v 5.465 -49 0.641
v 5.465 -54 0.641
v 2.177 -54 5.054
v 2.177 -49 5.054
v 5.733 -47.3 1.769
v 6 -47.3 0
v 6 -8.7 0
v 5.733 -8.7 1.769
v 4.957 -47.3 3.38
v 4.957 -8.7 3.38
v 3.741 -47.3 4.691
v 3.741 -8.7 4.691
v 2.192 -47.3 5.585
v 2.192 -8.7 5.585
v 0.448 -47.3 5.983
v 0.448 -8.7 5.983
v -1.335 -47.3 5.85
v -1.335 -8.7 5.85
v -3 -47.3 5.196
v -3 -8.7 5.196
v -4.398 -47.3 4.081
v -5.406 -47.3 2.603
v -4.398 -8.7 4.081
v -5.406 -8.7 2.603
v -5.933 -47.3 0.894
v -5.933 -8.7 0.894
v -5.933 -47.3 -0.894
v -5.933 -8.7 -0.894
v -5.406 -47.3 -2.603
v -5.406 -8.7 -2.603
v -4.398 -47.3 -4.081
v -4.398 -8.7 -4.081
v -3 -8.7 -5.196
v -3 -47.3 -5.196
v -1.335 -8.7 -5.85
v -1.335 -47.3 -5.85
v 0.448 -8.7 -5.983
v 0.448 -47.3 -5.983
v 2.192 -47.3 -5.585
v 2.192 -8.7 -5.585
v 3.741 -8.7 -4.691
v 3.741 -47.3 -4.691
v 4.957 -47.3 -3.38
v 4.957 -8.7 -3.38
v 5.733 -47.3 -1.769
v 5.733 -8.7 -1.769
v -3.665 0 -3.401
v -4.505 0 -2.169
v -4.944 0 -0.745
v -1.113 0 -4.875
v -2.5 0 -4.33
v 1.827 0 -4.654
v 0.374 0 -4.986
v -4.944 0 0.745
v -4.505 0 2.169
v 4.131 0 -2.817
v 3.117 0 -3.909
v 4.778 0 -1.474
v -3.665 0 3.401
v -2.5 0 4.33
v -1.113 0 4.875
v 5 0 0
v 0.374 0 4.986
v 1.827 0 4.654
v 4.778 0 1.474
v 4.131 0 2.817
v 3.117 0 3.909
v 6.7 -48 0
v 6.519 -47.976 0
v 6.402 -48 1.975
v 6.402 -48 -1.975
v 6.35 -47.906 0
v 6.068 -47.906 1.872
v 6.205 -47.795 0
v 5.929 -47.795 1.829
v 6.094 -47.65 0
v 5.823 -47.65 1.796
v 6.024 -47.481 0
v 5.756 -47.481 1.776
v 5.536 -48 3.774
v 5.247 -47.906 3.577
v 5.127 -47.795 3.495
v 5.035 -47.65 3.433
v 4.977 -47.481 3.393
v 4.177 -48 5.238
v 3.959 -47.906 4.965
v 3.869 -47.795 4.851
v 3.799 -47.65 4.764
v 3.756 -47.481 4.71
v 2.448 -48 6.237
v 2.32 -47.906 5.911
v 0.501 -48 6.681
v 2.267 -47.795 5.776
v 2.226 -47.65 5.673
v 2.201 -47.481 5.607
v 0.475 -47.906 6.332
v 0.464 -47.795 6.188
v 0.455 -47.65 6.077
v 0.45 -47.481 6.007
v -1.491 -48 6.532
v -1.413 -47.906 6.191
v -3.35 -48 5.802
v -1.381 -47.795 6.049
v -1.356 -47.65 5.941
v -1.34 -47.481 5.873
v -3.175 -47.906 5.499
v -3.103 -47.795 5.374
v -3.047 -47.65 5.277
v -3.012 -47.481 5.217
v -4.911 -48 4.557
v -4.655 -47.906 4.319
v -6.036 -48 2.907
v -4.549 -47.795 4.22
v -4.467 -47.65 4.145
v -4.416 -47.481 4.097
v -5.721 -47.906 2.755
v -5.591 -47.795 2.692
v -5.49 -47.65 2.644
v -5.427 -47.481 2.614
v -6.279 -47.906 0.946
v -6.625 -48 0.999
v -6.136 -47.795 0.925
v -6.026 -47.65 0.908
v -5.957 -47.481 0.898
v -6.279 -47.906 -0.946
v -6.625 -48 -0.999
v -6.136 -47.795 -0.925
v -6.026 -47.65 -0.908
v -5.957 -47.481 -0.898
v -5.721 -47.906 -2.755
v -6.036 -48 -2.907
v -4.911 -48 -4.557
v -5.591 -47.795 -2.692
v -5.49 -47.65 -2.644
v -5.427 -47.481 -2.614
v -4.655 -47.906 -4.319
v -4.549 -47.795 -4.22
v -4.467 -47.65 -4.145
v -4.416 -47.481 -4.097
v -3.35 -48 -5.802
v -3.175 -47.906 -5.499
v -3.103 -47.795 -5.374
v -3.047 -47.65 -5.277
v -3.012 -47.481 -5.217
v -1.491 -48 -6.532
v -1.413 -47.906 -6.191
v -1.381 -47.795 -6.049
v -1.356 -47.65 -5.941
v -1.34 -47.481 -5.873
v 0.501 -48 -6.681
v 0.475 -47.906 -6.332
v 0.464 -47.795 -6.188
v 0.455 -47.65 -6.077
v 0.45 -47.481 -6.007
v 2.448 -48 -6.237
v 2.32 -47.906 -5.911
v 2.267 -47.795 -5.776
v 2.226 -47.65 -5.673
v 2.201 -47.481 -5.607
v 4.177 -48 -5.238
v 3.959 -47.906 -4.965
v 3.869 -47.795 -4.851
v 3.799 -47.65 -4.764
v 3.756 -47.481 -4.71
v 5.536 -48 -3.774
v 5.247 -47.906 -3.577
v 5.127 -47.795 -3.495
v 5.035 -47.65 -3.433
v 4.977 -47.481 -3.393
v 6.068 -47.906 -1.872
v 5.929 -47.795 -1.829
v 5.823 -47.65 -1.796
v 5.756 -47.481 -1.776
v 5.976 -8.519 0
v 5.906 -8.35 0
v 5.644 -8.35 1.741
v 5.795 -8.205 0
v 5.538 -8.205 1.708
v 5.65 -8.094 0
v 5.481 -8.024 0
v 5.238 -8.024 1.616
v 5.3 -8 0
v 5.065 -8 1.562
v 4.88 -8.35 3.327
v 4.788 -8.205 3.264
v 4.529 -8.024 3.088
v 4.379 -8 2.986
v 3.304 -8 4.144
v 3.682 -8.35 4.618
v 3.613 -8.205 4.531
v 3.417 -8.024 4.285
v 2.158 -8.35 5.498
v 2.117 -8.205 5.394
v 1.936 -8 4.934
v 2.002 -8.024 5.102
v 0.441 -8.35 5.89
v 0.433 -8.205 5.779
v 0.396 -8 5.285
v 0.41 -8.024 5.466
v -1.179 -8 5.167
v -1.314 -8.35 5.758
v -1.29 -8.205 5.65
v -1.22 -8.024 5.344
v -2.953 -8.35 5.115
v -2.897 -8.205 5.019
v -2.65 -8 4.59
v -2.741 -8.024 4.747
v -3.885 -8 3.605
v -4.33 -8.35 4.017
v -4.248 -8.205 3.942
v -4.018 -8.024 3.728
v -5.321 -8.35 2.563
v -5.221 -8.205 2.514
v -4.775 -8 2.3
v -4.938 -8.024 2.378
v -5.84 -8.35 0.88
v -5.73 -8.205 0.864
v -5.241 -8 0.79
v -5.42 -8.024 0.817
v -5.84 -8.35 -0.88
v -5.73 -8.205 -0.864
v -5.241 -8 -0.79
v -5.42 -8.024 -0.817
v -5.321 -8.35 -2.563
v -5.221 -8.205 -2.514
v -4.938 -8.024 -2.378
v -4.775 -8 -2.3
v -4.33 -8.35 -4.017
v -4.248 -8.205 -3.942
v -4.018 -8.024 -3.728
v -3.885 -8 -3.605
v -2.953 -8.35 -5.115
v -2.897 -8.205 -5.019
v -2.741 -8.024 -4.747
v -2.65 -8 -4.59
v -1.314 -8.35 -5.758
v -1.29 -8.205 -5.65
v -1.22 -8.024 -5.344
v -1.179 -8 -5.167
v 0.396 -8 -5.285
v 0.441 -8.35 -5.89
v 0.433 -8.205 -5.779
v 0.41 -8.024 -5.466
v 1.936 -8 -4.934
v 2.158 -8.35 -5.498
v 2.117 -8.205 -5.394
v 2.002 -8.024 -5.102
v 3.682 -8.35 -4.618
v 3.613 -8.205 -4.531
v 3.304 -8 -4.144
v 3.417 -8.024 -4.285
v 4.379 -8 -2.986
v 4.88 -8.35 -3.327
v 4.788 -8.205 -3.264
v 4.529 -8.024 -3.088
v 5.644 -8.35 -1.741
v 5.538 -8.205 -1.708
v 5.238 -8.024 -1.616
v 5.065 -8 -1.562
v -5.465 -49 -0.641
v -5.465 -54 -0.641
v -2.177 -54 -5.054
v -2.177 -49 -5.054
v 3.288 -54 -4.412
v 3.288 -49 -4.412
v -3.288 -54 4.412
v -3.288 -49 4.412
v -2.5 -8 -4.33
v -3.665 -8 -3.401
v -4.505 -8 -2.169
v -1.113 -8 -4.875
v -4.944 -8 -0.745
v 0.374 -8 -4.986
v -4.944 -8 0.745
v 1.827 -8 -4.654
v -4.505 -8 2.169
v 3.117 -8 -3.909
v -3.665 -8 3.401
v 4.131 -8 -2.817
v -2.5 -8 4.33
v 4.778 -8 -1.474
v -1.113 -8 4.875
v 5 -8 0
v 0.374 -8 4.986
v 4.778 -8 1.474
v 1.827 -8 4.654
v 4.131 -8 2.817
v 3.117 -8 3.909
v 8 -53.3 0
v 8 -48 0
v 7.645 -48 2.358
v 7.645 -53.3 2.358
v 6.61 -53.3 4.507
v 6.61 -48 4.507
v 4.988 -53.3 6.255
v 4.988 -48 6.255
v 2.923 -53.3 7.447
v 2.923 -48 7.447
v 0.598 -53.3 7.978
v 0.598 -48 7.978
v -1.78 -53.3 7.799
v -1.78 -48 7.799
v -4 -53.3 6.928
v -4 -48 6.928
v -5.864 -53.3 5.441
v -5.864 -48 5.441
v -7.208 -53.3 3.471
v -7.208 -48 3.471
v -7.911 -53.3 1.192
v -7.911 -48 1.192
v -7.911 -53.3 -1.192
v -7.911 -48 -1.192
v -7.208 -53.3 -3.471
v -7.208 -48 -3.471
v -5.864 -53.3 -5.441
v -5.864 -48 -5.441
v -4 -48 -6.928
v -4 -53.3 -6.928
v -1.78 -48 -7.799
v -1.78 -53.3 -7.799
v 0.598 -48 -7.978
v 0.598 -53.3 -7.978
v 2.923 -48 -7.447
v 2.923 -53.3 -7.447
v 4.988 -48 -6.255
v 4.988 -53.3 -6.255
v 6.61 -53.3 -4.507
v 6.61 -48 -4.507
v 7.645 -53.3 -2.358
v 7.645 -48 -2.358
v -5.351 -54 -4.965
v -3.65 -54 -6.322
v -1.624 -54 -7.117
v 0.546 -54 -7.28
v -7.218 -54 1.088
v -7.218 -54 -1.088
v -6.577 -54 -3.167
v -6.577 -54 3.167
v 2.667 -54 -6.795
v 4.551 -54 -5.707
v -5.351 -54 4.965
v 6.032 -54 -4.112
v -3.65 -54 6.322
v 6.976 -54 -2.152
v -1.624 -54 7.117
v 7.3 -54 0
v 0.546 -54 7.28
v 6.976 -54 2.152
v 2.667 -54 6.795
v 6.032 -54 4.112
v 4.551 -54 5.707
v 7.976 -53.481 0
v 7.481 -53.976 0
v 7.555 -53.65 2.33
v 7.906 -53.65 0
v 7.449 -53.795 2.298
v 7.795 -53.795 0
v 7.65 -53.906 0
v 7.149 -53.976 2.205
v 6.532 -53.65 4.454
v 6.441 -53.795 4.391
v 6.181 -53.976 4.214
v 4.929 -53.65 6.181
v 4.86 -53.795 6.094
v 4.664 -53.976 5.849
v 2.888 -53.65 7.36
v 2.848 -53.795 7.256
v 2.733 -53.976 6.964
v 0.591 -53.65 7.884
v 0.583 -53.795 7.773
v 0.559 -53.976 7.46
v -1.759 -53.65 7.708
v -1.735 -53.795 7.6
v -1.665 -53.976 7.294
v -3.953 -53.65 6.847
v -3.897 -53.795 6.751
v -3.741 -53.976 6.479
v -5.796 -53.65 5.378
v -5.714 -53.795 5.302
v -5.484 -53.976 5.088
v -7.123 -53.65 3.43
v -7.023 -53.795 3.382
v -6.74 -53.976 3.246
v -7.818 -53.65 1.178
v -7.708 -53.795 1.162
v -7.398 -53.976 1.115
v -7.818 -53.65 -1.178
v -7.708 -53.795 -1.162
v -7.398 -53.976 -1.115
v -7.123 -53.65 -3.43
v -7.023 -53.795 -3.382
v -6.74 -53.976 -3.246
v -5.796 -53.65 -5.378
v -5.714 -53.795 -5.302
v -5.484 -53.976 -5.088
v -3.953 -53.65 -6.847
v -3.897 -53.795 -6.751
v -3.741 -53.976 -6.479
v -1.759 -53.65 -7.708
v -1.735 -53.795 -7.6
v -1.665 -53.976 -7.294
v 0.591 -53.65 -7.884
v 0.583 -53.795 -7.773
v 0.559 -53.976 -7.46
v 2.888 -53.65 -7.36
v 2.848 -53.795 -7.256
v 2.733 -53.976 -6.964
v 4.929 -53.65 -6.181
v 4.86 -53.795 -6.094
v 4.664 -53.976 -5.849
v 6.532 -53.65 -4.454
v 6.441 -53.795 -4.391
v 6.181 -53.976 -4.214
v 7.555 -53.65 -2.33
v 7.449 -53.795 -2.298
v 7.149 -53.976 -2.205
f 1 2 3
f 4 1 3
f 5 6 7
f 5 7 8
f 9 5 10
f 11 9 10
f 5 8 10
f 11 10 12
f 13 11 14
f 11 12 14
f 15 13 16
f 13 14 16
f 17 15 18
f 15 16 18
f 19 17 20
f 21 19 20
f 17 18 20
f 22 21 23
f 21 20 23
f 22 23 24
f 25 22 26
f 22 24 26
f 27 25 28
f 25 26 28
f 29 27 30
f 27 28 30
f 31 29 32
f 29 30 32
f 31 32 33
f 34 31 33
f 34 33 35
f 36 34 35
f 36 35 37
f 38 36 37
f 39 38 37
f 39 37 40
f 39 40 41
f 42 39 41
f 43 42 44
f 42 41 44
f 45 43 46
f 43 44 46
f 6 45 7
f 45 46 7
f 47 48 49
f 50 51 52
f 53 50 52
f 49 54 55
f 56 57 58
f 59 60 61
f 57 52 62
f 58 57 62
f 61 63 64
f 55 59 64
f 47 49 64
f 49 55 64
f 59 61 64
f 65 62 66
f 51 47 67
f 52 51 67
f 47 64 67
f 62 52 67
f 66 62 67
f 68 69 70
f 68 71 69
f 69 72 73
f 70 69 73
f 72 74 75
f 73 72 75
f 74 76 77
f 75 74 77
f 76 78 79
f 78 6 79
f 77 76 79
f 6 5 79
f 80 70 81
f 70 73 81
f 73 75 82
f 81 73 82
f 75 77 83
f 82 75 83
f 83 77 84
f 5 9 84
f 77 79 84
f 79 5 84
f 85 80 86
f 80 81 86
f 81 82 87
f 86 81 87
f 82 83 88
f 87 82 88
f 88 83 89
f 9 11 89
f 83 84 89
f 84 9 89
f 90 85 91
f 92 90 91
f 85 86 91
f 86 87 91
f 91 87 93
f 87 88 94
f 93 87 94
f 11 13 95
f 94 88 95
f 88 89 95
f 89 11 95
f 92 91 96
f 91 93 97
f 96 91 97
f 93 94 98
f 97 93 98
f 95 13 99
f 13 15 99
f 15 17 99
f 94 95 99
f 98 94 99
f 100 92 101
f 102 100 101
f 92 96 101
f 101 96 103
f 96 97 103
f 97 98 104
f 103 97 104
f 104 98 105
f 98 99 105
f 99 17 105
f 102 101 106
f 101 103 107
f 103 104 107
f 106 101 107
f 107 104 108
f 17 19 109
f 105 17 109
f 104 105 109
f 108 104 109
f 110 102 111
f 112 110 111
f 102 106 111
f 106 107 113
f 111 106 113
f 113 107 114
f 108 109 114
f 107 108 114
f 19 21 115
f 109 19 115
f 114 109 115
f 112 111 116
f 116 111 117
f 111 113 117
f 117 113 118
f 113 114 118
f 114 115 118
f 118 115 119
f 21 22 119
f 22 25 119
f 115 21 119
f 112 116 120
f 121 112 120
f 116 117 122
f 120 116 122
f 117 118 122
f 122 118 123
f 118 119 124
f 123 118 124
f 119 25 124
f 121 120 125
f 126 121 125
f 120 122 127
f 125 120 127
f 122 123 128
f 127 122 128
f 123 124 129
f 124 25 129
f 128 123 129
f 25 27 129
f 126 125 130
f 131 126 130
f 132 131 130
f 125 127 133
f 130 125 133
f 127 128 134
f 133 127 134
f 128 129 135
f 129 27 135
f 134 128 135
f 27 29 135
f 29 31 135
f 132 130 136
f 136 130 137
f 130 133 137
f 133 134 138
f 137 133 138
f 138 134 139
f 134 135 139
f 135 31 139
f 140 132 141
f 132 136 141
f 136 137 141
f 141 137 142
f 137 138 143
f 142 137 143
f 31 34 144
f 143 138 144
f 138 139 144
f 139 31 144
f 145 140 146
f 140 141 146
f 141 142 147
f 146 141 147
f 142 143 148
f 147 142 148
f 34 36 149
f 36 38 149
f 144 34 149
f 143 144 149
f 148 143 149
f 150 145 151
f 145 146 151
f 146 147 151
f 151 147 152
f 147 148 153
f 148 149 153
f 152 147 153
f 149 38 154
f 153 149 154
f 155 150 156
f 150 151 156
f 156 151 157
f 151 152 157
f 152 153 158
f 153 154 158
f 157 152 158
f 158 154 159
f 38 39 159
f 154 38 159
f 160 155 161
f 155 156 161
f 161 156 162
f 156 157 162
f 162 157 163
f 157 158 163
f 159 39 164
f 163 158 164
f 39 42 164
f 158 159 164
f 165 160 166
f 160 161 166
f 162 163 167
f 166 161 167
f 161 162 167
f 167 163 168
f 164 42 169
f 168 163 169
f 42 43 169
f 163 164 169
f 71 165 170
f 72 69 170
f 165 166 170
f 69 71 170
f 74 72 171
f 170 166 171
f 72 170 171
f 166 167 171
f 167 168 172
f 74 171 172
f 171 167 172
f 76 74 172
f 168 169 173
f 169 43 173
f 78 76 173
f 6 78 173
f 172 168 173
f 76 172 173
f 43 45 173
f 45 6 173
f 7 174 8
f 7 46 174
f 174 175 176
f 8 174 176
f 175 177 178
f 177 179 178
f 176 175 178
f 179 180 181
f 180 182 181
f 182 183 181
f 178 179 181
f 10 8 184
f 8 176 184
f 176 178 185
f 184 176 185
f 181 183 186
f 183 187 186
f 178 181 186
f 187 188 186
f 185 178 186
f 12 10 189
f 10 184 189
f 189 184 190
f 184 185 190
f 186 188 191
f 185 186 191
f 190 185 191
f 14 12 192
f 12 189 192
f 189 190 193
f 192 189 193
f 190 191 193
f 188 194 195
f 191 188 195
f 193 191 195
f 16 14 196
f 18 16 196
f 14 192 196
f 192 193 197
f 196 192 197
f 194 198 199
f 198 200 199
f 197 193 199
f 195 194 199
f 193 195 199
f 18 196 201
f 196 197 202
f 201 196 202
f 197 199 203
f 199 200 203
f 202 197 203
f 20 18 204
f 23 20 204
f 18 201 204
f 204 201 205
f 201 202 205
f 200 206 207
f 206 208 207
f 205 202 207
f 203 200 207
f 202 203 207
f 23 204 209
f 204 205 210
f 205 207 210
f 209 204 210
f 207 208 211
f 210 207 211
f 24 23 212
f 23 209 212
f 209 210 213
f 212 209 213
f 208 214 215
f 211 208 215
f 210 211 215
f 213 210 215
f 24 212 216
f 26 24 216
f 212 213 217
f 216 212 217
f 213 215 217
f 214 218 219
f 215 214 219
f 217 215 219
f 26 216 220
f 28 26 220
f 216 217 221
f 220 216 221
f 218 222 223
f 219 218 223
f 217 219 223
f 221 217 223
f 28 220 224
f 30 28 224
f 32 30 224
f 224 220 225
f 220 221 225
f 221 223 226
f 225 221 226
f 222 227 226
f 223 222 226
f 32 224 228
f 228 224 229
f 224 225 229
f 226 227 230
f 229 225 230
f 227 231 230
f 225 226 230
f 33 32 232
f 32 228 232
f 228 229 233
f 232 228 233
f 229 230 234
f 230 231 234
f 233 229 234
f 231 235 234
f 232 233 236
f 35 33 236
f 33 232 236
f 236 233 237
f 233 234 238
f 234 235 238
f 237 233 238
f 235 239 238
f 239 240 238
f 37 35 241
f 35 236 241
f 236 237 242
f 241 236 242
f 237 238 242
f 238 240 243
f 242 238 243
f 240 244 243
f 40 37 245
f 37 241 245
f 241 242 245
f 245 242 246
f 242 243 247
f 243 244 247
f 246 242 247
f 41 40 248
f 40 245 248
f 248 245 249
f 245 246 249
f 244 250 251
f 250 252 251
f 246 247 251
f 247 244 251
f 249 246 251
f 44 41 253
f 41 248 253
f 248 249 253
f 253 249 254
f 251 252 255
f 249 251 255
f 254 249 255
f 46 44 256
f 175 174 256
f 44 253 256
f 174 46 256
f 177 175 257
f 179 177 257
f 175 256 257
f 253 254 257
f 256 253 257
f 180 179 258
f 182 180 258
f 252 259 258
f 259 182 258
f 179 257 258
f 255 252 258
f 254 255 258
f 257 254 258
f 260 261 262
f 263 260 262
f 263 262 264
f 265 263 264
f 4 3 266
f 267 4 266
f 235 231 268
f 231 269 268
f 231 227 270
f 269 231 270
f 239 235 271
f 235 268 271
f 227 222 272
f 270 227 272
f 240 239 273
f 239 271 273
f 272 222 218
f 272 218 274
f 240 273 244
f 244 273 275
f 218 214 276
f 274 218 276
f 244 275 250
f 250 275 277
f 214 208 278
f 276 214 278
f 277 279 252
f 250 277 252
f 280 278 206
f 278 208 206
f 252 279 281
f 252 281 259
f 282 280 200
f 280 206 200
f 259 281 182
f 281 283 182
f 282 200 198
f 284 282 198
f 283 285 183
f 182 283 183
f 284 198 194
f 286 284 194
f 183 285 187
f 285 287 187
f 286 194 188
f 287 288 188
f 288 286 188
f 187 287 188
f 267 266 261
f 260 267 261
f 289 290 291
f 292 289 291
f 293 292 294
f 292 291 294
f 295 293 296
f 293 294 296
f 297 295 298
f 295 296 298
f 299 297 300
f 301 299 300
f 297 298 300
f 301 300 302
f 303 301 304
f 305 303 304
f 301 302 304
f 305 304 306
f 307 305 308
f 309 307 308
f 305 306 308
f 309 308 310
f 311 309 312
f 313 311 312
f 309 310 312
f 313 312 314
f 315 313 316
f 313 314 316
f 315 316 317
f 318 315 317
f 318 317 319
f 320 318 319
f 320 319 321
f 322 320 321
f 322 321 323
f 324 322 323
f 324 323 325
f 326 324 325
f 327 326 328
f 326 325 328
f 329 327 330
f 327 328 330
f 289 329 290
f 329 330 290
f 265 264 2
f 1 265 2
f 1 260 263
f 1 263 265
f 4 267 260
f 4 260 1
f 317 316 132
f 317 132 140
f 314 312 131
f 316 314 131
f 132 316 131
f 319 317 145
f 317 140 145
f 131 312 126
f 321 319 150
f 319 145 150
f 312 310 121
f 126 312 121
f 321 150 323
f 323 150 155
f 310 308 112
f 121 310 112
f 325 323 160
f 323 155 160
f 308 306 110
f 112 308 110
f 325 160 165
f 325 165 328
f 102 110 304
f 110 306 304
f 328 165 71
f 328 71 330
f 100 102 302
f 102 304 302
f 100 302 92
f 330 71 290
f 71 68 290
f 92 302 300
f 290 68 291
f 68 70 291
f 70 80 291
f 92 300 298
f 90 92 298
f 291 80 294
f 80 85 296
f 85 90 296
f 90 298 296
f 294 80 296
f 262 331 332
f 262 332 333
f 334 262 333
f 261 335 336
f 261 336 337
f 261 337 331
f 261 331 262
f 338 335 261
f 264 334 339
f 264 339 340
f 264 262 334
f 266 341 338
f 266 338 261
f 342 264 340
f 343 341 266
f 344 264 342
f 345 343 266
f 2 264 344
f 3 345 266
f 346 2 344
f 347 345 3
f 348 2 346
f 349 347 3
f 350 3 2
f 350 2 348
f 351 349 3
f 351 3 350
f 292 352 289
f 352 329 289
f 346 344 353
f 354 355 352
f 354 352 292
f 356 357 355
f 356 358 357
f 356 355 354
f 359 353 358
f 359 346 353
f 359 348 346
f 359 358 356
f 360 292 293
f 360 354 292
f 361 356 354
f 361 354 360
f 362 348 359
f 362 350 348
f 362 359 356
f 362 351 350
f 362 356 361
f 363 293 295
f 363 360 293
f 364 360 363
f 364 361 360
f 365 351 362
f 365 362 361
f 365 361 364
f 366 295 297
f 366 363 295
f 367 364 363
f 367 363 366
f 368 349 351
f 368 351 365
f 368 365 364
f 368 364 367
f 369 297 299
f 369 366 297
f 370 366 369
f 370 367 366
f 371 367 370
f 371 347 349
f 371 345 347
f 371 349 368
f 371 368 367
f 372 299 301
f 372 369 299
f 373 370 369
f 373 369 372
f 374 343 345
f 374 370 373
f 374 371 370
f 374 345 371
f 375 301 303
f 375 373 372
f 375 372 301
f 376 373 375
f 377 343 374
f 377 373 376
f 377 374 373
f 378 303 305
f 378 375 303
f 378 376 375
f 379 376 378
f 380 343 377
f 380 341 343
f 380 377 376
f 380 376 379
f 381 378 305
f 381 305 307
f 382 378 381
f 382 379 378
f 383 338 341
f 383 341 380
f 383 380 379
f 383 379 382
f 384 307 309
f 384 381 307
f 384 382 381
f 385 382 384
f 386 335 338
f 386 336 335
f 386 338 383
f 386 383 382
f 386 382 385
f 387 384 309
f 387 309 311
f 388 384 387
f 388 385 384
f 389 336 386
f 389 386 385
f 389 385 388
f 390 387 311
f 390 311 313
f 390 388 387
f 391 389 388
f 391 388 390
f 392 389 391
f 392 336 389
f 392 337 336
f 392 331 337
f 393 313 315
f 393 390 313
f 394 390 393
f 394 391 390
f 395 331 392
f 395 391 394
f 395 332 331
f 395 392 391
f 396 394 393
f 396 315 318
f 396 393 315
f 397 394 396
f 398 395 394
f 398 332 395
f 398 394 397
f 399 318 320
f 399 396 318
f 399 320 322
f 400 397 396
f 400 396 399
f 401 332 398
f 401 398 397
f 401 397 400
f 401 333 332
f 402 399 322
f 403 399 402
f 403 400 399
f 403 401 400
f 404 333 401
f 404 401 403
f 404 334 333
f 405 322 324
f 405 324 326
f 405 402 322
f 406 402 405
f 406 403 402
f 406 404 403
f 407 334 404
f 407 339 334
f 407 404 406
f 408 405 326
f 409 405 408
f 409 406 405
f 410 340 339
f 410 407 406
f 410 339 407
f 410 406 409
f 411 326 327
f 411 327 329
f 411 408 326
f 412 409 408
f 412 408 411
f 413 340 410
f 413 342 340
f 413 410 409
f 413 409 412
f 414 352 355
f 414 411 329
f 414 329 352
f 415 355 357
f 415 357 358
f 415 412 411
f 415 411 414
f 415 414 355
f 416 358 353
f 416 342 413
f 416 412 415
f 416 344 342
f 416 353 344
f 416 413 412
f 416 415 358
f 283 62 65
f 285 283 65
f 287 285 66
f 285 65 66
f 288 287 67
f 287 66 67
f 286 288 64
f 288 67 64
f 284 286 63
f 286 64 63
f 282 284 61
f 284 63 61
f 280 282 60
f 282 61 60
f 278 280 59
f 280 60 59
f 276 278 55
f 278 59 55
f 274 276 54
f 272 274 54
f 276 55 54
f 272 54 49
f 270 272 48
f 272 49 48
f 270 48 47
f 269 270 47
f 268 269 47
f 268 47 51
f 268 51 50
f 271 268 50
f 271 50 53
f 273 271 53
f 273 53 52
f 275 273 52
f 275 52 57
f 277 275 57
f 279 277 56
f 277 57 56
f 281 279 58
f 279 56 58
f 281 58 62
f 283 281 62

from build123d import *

# Parameters (mm, degrees)
F0_R     = 5
F1_DEPTH = 8
F2_R     = 6
F2_R_2   = 5
F3_DEPTH = 40
F4_R     = 8
F4_R_2   = 6
F5_DEPTH = 6
F7_DEPTH = 5
F8_R     = 0.7


with BuildPart() as f1:
    # F0 (on Front) → F1 (new body)
    with BuildSketch(Plane.XZ):
        Circle(F0_R)
    extrude(amount=F1_DEPTH)

    # F2 (on face) → F3 (join)
    with BuildSketch(Plane.XZ.offset(8)):
        Circle(F2_R)
        Circle(F2_R_2, mode=Mode.SUBTRACT)
        Circle(F2_R_2)
    extrude(amount=F3_DEPTH)

    # F4 (on face) → F5 (join)
    with BuildSketch(Plane.XZ.offset(48)):
        Circle(F4_R)
        Circle(F4_R_2, mode=Mode.SUBTRACT)
        Circle(F4_R_2)
    extrude(amount=F5_DEPTH)

    # F6 (on face) → F7 (cut)
    with BuildSketch(Plane.XZ.offset(54)):
        Polygon((3.2881409233, -4.4123181388), (5.4652500594, 0.6414545014), (2.1771091361, 5.0537726402), (-3.2881409233, 4.4123181388), (-5.4652500594, -0.6414545014), (-2.1771091361, -5.0537726402), align=None)
    extrude(amount=-F7_DEPTH, mode=Mode.SUBTRACT)

    # F8
    f8_edges = [f1.edges().sort_by_distance(p)[0] for p in [
        (6, -28, 0),
        (-6, -8, 0),
        (-6, -48, 0),
        (-8, -54, 0),
    ]]
    fillet(f8_edges, radius=F8_R)


solid = f1.part
